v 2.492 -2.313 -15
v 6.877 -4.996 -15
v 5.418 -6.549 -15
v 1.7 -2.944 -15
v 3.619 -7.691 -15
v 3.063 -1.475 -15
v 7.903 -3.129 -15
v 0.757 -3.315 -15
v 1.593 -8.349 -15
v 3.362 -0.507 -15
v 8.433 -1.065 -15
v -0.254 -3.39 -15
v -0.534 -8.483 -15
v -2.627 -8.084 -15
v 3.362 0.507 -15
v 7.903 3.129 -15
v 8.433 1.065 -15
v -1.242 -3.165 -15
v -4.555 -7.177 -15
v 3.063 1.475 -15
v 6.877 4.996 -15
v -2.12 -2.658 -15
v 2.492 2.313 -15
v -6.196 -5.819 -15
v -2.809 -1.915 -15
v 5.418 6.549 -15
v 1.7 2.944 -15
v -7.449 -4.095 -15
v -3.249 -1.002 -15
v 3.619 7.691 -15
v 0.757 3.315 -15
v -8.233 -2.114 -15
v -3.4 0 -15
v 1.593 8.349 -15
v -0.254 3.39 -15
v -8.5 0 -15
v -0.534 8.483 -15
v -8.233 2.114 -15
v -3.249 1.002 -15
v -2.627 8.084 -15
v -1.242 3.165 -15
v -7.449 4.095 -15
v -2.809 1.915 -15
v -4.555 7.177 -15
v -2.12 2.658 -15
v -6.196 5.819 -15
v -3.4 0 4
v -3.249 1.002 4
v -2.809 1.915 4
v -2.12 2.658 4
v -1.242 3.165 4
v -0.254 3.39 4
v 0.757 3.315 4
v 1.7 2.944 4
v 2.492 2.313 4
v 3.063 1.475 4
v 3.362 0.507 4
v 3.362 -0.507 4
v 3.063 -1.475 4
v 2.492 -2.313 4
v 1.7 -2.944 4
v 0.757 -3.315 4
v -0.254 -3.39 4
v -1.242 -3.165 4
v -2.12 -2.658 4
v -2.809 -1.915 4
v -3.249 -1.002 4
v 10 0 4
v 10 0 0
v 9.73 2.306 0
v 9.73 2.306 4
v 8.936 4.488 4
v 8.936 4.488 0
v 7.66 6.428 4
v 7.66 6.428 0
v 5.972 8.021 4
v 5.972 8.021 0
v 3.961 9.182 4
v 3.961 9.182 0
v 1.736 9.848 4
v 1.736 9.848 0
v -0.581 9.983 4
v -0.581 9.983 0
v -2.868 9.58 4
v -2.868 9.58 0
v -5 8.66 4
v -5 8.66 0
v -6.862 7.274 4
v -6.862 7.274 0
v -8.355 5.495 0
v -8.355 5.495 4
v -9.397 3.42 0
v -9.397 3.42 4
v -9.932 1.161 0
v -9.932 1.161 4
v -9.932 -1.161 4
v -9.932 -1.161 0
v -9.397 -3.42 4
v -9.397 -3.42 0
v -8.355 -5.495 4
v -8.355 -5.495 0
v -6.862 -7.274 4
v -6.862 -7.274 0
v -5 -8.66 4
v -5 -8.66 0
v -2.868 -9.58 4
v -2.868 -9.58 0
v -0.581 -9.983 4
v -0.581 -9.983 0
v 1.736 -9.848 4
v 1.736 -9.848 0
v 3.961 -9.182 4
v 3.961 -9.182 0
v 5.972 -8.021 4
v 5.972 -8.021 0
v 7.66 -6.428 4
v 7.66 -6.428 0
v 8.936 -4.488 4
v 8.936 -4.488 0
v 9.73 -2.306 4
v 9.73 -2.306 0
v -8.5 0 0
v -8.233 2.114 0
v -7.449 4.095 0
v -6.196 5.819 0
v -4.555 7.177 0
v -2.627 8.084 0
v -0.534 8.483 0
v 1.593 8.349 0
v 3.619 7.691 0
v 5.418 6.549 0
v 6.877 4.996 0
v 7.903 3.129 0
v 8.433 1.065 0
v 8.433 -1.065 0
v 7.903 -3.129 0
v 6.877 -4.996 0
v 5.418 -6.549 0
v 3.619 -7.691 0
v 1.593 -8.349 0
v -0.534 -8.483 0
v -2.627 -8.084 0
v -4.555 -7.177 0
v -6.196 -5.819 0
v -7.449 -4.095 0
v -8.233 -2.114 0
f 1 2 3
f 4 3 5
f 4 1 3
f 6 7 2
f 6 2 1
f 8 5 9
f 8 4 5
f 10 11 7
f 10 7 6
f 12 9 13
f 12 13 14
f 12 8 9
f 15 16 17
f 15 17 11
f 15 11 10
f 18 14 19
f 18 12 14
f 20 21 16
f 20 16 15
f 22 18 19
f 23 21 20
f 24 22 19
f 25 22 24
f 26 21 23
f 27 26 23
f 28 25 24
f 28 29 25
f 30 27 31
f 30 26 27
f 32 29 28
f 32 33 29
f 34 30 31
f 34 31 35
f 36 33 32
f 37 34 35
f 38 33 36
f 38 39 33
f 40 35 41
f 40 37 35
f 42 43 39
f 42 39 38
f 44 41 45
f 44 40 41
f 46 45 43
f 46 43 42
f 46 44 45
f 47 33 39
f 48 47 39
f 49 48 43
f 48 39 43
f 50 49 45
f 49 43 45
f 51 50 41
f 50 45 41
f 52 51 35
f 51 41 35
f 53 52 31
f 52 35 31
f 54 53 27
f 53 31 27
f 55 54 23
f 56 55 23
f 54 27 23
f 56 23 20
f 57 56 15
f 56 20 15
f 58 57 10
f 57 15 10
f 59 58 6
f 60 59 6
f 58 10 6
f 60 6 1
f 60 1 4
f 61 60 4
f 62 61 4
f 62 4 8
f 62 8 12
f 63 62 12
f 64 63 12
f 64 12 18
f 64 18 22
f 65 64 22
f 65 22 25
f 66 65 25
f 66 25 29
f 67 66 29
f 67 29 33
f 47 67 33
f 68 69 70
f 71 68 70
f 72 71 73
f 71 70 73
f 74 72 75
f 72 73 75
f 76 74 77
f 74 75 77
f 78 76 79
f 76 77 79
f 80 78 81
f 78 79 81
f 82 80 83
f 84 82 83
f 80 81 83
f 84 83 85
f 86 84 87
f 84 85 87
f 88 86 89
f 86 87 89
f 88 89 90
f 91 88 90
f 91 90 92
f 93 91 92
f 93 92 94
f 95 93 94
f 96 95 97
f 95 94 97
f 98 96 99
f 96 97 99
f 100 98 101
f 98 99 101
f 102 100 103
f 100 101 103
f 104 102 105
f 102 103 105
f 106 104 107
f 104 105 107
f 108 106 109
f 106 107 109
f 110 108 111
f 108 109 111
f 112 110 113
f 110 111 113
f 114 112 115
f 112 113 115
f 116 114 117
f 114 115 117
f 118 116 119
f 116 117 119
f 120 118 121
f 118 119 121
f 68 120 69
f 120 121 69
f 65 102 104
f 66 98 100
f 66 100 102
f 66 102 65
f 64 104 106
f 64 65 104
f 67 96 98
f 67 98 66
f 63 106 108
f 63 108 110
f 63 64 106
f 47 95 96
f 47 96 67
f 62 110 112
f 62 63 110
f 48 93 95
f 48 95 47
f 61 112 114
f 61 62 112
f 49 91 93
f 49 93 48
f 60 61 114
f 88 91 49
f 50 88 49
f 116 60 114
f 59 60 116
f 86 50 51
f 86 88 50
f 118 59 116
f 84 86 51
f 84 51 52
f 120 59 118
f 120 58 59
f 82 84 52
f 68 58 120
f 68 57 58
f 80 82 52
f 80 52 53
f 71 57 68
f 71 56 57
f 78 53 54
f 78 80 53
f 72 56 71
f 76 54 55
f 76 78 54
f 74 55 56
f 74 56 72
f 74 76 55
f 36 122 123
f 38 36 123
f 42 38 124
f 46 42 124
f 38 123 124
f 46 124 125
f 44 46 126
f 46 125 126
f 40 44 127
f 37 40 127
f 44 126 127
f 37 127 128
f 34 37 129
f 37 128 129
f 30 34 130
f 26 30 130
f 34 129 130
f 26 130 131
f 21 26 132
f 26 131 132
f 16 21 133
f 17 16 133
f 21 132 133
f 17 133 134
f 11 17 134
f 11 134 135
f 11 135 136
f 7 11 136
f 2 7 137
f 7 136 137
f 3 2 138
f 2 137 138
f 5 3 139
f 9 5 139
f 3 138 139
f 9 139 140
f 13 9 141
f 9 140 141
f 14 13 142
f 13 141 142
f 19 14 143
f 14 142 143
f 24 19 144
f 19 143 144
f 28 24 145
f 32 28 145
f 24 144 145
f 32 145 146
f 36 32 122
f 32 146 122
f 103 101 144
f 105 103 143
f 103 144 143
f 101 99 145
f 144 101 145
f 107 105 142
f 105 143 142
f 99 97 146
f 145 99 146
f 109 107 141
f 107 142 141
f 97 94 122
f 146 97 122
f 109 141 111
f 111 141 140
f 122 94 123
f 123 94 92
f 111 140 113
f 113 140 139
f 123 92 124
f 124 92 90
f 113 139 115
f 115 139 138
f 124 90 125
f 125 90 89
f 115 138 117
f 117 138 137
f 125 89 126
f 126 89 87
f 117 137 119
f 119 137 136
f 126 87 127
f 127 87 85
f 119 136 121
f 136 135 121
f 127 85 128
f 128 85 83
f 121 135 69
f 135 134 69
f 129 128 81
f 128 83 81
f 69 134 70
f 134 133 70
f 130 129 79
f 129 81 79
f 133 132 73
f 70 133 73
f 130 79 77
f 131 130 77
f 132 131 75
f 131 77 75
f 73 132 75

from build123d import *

# Parameters (mm, degrees)
SKETCH1_R              = 10
BOSS_EXTRUDE1_DEPTH    = 4
SKETCH2_R              = 8.5
BOSS_EXTRUDE2_DEPTH    = 15
M8X1_25_TAPPED_HOLE2_D = 6.8


with BuildPart() as part:
    # Sketch1 → Boss-Extrude1 (new body)
    with BuildSketch(Plane.XY):
        Circle(SKETCH1_R)
    extrude(amount=BOSS_EXTRUDE1_DEPTH)

    # Sketch2 → Boss-Extrude2 (add)
    with BuildSketch(Plane(origin=(0, 0, 0), x_dir=(-1, 0, 0), z_dir=(0, 0, -1))):
        Circle(SKETCH2_R)
    extrude(amount=BOSS_EXTRUDE2_DEPTH)

    # M8x1.25 Tapped Hole2 (through all)
    with Locations(Plane.XY.offset(4)):
        with Locations((0, 0)):
            Hole(M8X1_25_TAPPED_HOLE2_D / 2)


solid = part.part
